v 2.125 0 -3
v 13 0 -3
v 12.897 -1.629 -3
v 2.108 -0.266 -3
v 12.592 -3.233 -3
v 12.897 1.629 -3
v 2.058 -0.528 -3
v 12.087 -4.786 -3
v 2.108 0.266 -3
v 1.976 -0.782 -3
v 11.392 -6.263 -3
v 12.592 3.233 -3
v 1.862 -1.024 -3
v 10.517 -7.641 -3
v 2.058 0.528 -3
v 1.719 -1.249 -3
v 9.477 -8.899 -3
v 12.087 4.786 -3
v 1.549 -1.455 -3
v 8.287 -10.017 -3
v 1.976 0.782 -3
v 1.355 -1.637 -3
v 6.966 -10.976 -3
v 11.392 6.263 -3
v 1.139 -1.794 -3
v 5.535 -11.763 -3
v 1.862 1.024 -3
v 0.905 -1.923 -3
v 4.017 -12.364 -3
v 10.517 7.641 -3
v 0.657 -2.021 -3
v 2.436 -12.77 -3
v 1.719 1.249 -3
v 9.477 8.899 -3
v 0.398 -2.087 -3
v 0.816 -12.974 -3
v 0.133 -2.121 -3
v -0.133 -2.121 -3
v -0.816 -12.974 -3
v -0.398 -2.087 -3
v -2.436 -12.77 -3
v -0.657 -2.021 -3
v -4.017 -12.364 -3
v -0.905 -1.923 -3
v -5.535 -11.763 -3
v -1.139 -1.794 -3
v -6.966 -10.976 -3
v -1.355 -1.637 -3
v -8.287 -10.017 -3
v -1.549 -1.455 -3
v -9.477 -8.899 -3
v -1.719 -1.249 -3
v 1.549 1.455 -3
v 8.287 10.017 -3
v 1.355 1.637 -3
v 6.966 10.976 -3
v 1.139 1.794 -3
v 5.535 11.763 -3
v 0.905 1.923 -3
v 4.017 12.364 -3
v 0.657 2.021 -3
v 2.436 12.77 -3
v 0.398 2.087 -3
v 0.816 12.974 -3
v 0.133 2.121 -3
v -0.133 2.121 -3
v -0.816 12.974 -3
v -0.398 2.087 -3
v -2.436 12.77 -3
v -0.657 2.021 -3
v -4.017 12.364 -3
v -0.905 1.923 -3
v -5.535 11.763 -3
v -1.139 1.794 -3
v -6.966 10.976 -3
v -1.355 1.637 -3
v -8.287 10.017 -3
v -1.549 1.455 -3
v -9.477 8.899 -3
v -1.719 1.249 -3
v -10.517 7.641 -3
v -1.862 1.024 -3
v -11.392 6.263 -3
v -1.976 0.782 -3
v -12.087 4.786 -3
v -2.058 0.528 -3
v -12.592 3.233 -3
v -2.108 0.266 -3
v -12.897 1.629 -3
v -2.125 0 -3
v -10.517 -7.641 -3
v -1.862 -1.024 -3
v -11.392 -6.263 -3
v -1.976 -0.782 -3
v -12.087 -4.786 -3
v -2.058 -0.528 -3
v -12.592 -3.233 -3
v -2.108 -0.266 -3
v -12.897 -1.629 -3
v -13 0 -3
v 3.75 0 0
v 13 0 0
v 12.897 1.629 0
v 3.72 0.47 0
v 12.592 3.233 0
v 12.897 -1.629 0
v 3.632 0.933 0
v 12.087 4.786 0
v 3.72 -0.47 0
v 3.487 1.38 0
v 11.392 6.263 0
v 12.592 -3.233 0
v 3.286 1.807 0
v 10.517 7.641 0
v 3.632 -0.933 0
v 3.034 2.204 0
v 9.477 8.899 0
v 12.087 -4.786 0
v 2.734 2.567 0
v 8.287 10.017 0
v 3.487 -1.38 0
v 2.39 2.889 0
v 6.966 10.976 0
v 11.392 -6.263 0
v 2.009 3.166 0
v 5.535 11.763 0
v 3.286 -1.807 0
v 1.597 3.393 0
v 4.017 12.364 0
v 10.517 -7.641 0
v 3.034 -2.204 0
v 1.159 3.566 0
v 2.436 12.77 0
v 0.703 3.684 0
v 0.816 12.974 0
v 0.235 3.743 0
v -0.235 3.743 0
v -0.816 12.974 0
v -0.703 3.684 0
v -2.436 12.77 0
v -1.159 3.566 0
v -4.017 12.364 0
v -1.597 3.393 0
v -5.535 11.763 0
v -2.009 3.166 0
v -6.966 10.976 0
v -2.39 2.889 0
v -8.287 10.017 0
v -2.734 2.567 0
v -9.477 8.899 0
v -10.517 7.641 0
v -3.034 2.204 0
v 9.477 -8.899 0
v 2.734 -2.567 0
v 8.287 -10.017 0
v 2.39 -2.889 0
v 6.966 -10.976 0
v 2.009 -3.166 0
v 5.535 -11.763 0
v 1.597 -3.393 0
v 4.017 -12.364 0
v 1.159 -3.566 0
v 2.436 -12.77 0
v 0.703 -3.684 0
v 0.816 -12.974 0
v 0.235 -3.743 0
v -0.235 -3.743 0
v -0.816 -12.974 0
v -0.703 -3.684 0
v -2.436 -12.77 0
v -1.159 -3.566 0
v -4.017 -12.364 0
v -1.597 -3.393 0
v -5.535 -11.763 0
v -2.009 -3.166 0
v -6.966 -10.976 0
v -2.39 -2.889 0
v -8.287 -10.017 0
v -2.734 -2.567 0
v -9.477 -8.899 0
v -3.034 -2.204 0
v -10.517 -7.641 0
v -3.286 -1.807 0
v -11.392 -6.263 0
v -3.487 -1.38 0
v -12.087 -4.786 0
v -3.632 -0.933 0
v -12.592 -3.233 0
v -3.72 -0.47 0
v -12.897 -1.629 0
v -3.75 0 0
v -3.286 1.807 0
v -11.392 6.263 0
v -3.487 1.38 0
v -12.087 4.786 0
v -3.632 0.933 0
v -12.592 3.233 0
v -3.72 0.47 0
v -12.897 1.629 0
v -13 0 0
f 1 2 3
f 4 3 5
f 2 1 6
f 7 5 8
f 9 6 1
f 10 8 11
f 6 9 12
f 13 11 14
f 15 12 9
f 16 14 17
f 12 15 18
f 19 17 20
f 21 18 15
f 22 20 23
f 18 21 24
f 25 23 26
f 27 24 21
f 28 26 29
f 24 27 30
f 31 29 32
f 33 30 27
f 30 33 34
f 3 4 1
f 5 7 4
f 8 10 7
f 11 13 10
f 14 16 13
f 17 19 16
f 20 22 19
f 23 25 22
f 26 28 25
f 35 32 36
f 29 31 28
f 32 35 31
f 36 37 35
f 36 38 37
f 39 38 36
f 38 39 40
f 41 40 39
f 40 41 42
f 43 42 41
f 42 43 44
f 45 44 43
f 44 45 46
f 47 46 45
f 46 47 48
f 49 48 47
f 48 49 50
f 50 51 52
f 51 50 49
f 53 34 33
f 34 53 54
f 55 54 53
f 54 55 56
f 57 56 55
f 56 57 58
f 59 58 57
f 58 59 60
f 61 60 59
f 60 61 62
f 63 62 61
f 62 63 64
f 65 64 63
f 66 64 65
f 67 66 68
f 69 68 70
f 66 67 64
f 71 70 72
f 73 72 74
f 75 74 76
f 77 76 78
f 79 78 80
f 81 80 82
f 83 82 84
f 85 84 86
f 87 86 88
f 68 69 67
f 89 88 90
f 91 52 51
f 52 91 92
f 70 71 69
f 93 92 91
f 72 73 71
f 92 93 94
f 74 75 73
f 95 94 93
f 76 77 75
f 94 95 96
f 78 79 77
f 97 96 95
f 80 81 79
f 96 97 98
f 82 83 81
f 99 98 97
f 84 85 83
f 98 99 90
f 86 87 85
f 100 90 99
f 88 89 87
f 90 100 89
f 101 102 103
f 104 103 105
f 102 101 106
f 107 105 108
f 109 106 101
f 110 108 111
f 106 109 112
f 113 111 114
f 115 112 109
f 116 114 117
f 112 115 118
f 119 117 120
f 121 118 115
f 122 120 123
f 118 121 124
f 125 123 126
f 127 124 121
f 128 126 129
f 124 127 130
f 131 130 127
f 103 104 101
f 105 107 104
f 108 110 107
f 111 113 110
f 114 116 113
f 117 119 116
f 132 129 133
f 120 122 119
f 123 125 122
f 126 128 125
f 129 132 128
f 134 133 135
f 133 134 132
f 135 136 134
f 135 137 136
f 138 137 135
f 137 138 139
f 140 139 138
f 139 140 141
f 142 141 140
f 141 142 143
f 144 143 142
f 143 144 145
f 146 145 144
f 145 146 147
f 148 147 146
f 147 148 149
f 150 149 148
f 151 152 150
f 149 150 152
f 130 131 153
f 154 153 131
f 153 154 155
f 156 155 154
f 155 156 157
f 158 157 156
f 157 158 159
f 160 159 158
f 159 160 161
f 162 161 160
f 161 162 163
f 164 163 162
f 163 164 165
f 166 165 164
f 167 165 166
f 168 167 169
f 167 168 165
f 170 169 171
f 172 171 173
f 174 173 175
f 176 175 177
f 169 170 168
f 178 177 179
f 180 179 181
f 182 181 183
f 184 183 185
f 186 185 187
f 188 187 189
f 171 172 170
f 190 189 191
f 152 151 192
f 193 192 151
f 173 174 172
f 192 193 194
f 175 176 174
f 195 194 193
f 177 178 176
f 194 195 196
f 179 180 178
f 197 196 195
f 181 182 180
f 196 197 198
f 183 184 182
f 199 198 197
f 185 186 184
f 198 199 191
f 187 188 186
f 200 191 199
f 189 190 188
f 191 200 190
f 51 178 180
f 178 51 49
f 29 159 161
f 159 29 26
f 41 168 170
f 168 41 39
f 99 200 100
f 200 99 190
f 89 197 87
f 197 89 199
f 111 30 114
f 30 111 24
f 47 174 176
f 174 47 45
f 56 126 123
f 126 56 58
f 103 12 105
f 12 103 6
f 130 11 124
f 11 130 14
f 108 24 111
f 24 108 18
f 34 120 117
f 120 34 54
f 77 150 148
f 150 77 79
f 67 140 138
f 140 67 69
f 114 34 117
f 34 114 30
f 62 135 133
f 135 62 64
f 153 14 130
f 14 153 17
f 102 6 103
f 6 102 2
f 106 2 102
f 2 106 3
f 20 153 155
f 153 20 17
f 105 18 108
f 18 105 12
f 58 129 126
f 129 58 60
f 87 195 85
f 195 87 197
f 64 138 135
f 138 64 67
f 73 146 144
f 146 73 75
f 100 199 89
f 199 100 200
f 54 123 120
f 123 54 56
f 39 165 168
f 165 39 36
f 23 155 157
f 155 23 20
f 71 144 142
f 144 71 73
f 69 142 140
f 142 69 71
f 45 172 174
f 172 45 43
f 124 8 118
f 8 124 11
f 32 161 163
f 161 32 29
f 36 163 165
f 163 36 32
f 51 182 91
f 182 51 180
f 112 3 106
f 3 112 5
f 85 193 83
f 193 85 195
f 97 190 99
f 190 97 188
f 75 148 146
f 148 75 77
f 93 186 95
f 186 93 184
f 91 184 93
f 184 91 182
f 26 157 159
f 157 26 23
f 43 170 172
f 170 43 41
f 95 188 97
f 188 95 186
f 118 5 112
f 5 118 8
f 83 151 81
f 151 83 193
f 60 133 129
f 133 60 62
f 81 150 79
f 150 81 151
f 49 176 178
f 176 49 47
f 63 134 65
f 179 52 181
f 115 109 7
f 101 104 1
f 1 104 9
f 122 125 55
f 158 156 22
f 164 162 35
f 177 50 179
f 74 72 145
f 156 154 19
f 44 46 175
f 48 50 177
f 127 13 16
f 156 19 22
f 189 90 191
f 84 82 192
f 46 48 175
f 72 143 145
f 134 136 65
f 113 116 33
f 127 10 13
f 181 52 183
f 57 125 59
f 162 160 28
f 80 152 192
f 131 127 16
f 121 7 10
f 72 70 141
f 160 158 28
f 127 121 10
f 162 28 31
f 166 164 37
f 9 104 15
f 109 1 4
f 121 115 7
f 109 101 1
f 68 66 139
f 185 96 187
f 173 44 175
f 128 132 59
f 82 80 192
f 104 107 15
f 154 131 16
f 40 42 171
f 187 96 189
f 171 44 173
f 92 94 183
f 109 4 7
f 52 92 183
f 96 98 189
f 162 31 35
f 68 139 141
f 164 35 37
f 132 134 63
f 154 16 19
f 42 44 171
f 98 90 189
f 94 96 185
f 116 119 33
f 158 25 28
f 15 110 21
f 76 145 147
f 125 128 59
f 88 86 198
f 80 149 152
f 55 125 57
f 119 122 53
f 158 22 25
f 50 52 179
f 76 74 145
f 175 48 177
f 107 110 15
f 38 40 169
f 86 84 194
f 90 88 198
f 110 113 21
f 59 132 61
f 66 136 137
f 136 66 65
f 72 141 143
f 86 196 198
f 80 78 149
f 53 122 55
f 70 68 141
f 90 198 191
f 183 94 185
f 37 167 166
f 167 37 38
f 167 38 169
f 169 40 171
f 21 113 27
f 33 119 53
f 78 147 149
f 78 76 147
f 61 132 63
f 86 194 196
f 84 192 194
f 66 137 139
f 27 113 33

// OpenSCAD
$fn = 50;


difference() {
	union() {
		translate(v = [0, 0, -3.0000000000]) {
			cylinder(h = 3, r = 7.0000000000);
		}
		translate(v = [0, 0, -3.0000000000]) {
			cylinder(h = 3, r = 13.0000000000);
		}
	}
	union() {
		translate(v = [0, 0, 0]) {
			rotate(a = [0, 0, 0]) {
				difference() {
					union() {
						#translate(v = [0, 0, -3.0000000000]) {
							cylinder(h = 3, r = 2.0000000000);
						}
						#translate(v = [0, 0, -3]) {
							cylinder(h = 3, r1 = 2.1250000000, r2 = 3.7500000000);
						}
						#translate(v = [0, 0, -3.0000000000]) {
							cylinder(h = 3, r = 2.1250000000);
						}
						#translate(v = [0, 0, -3.0000000000]) {
							cylinder(h = 3, r = 2.0000000000);
						}
					}
					union();
				}
			}
		}
	}
}
